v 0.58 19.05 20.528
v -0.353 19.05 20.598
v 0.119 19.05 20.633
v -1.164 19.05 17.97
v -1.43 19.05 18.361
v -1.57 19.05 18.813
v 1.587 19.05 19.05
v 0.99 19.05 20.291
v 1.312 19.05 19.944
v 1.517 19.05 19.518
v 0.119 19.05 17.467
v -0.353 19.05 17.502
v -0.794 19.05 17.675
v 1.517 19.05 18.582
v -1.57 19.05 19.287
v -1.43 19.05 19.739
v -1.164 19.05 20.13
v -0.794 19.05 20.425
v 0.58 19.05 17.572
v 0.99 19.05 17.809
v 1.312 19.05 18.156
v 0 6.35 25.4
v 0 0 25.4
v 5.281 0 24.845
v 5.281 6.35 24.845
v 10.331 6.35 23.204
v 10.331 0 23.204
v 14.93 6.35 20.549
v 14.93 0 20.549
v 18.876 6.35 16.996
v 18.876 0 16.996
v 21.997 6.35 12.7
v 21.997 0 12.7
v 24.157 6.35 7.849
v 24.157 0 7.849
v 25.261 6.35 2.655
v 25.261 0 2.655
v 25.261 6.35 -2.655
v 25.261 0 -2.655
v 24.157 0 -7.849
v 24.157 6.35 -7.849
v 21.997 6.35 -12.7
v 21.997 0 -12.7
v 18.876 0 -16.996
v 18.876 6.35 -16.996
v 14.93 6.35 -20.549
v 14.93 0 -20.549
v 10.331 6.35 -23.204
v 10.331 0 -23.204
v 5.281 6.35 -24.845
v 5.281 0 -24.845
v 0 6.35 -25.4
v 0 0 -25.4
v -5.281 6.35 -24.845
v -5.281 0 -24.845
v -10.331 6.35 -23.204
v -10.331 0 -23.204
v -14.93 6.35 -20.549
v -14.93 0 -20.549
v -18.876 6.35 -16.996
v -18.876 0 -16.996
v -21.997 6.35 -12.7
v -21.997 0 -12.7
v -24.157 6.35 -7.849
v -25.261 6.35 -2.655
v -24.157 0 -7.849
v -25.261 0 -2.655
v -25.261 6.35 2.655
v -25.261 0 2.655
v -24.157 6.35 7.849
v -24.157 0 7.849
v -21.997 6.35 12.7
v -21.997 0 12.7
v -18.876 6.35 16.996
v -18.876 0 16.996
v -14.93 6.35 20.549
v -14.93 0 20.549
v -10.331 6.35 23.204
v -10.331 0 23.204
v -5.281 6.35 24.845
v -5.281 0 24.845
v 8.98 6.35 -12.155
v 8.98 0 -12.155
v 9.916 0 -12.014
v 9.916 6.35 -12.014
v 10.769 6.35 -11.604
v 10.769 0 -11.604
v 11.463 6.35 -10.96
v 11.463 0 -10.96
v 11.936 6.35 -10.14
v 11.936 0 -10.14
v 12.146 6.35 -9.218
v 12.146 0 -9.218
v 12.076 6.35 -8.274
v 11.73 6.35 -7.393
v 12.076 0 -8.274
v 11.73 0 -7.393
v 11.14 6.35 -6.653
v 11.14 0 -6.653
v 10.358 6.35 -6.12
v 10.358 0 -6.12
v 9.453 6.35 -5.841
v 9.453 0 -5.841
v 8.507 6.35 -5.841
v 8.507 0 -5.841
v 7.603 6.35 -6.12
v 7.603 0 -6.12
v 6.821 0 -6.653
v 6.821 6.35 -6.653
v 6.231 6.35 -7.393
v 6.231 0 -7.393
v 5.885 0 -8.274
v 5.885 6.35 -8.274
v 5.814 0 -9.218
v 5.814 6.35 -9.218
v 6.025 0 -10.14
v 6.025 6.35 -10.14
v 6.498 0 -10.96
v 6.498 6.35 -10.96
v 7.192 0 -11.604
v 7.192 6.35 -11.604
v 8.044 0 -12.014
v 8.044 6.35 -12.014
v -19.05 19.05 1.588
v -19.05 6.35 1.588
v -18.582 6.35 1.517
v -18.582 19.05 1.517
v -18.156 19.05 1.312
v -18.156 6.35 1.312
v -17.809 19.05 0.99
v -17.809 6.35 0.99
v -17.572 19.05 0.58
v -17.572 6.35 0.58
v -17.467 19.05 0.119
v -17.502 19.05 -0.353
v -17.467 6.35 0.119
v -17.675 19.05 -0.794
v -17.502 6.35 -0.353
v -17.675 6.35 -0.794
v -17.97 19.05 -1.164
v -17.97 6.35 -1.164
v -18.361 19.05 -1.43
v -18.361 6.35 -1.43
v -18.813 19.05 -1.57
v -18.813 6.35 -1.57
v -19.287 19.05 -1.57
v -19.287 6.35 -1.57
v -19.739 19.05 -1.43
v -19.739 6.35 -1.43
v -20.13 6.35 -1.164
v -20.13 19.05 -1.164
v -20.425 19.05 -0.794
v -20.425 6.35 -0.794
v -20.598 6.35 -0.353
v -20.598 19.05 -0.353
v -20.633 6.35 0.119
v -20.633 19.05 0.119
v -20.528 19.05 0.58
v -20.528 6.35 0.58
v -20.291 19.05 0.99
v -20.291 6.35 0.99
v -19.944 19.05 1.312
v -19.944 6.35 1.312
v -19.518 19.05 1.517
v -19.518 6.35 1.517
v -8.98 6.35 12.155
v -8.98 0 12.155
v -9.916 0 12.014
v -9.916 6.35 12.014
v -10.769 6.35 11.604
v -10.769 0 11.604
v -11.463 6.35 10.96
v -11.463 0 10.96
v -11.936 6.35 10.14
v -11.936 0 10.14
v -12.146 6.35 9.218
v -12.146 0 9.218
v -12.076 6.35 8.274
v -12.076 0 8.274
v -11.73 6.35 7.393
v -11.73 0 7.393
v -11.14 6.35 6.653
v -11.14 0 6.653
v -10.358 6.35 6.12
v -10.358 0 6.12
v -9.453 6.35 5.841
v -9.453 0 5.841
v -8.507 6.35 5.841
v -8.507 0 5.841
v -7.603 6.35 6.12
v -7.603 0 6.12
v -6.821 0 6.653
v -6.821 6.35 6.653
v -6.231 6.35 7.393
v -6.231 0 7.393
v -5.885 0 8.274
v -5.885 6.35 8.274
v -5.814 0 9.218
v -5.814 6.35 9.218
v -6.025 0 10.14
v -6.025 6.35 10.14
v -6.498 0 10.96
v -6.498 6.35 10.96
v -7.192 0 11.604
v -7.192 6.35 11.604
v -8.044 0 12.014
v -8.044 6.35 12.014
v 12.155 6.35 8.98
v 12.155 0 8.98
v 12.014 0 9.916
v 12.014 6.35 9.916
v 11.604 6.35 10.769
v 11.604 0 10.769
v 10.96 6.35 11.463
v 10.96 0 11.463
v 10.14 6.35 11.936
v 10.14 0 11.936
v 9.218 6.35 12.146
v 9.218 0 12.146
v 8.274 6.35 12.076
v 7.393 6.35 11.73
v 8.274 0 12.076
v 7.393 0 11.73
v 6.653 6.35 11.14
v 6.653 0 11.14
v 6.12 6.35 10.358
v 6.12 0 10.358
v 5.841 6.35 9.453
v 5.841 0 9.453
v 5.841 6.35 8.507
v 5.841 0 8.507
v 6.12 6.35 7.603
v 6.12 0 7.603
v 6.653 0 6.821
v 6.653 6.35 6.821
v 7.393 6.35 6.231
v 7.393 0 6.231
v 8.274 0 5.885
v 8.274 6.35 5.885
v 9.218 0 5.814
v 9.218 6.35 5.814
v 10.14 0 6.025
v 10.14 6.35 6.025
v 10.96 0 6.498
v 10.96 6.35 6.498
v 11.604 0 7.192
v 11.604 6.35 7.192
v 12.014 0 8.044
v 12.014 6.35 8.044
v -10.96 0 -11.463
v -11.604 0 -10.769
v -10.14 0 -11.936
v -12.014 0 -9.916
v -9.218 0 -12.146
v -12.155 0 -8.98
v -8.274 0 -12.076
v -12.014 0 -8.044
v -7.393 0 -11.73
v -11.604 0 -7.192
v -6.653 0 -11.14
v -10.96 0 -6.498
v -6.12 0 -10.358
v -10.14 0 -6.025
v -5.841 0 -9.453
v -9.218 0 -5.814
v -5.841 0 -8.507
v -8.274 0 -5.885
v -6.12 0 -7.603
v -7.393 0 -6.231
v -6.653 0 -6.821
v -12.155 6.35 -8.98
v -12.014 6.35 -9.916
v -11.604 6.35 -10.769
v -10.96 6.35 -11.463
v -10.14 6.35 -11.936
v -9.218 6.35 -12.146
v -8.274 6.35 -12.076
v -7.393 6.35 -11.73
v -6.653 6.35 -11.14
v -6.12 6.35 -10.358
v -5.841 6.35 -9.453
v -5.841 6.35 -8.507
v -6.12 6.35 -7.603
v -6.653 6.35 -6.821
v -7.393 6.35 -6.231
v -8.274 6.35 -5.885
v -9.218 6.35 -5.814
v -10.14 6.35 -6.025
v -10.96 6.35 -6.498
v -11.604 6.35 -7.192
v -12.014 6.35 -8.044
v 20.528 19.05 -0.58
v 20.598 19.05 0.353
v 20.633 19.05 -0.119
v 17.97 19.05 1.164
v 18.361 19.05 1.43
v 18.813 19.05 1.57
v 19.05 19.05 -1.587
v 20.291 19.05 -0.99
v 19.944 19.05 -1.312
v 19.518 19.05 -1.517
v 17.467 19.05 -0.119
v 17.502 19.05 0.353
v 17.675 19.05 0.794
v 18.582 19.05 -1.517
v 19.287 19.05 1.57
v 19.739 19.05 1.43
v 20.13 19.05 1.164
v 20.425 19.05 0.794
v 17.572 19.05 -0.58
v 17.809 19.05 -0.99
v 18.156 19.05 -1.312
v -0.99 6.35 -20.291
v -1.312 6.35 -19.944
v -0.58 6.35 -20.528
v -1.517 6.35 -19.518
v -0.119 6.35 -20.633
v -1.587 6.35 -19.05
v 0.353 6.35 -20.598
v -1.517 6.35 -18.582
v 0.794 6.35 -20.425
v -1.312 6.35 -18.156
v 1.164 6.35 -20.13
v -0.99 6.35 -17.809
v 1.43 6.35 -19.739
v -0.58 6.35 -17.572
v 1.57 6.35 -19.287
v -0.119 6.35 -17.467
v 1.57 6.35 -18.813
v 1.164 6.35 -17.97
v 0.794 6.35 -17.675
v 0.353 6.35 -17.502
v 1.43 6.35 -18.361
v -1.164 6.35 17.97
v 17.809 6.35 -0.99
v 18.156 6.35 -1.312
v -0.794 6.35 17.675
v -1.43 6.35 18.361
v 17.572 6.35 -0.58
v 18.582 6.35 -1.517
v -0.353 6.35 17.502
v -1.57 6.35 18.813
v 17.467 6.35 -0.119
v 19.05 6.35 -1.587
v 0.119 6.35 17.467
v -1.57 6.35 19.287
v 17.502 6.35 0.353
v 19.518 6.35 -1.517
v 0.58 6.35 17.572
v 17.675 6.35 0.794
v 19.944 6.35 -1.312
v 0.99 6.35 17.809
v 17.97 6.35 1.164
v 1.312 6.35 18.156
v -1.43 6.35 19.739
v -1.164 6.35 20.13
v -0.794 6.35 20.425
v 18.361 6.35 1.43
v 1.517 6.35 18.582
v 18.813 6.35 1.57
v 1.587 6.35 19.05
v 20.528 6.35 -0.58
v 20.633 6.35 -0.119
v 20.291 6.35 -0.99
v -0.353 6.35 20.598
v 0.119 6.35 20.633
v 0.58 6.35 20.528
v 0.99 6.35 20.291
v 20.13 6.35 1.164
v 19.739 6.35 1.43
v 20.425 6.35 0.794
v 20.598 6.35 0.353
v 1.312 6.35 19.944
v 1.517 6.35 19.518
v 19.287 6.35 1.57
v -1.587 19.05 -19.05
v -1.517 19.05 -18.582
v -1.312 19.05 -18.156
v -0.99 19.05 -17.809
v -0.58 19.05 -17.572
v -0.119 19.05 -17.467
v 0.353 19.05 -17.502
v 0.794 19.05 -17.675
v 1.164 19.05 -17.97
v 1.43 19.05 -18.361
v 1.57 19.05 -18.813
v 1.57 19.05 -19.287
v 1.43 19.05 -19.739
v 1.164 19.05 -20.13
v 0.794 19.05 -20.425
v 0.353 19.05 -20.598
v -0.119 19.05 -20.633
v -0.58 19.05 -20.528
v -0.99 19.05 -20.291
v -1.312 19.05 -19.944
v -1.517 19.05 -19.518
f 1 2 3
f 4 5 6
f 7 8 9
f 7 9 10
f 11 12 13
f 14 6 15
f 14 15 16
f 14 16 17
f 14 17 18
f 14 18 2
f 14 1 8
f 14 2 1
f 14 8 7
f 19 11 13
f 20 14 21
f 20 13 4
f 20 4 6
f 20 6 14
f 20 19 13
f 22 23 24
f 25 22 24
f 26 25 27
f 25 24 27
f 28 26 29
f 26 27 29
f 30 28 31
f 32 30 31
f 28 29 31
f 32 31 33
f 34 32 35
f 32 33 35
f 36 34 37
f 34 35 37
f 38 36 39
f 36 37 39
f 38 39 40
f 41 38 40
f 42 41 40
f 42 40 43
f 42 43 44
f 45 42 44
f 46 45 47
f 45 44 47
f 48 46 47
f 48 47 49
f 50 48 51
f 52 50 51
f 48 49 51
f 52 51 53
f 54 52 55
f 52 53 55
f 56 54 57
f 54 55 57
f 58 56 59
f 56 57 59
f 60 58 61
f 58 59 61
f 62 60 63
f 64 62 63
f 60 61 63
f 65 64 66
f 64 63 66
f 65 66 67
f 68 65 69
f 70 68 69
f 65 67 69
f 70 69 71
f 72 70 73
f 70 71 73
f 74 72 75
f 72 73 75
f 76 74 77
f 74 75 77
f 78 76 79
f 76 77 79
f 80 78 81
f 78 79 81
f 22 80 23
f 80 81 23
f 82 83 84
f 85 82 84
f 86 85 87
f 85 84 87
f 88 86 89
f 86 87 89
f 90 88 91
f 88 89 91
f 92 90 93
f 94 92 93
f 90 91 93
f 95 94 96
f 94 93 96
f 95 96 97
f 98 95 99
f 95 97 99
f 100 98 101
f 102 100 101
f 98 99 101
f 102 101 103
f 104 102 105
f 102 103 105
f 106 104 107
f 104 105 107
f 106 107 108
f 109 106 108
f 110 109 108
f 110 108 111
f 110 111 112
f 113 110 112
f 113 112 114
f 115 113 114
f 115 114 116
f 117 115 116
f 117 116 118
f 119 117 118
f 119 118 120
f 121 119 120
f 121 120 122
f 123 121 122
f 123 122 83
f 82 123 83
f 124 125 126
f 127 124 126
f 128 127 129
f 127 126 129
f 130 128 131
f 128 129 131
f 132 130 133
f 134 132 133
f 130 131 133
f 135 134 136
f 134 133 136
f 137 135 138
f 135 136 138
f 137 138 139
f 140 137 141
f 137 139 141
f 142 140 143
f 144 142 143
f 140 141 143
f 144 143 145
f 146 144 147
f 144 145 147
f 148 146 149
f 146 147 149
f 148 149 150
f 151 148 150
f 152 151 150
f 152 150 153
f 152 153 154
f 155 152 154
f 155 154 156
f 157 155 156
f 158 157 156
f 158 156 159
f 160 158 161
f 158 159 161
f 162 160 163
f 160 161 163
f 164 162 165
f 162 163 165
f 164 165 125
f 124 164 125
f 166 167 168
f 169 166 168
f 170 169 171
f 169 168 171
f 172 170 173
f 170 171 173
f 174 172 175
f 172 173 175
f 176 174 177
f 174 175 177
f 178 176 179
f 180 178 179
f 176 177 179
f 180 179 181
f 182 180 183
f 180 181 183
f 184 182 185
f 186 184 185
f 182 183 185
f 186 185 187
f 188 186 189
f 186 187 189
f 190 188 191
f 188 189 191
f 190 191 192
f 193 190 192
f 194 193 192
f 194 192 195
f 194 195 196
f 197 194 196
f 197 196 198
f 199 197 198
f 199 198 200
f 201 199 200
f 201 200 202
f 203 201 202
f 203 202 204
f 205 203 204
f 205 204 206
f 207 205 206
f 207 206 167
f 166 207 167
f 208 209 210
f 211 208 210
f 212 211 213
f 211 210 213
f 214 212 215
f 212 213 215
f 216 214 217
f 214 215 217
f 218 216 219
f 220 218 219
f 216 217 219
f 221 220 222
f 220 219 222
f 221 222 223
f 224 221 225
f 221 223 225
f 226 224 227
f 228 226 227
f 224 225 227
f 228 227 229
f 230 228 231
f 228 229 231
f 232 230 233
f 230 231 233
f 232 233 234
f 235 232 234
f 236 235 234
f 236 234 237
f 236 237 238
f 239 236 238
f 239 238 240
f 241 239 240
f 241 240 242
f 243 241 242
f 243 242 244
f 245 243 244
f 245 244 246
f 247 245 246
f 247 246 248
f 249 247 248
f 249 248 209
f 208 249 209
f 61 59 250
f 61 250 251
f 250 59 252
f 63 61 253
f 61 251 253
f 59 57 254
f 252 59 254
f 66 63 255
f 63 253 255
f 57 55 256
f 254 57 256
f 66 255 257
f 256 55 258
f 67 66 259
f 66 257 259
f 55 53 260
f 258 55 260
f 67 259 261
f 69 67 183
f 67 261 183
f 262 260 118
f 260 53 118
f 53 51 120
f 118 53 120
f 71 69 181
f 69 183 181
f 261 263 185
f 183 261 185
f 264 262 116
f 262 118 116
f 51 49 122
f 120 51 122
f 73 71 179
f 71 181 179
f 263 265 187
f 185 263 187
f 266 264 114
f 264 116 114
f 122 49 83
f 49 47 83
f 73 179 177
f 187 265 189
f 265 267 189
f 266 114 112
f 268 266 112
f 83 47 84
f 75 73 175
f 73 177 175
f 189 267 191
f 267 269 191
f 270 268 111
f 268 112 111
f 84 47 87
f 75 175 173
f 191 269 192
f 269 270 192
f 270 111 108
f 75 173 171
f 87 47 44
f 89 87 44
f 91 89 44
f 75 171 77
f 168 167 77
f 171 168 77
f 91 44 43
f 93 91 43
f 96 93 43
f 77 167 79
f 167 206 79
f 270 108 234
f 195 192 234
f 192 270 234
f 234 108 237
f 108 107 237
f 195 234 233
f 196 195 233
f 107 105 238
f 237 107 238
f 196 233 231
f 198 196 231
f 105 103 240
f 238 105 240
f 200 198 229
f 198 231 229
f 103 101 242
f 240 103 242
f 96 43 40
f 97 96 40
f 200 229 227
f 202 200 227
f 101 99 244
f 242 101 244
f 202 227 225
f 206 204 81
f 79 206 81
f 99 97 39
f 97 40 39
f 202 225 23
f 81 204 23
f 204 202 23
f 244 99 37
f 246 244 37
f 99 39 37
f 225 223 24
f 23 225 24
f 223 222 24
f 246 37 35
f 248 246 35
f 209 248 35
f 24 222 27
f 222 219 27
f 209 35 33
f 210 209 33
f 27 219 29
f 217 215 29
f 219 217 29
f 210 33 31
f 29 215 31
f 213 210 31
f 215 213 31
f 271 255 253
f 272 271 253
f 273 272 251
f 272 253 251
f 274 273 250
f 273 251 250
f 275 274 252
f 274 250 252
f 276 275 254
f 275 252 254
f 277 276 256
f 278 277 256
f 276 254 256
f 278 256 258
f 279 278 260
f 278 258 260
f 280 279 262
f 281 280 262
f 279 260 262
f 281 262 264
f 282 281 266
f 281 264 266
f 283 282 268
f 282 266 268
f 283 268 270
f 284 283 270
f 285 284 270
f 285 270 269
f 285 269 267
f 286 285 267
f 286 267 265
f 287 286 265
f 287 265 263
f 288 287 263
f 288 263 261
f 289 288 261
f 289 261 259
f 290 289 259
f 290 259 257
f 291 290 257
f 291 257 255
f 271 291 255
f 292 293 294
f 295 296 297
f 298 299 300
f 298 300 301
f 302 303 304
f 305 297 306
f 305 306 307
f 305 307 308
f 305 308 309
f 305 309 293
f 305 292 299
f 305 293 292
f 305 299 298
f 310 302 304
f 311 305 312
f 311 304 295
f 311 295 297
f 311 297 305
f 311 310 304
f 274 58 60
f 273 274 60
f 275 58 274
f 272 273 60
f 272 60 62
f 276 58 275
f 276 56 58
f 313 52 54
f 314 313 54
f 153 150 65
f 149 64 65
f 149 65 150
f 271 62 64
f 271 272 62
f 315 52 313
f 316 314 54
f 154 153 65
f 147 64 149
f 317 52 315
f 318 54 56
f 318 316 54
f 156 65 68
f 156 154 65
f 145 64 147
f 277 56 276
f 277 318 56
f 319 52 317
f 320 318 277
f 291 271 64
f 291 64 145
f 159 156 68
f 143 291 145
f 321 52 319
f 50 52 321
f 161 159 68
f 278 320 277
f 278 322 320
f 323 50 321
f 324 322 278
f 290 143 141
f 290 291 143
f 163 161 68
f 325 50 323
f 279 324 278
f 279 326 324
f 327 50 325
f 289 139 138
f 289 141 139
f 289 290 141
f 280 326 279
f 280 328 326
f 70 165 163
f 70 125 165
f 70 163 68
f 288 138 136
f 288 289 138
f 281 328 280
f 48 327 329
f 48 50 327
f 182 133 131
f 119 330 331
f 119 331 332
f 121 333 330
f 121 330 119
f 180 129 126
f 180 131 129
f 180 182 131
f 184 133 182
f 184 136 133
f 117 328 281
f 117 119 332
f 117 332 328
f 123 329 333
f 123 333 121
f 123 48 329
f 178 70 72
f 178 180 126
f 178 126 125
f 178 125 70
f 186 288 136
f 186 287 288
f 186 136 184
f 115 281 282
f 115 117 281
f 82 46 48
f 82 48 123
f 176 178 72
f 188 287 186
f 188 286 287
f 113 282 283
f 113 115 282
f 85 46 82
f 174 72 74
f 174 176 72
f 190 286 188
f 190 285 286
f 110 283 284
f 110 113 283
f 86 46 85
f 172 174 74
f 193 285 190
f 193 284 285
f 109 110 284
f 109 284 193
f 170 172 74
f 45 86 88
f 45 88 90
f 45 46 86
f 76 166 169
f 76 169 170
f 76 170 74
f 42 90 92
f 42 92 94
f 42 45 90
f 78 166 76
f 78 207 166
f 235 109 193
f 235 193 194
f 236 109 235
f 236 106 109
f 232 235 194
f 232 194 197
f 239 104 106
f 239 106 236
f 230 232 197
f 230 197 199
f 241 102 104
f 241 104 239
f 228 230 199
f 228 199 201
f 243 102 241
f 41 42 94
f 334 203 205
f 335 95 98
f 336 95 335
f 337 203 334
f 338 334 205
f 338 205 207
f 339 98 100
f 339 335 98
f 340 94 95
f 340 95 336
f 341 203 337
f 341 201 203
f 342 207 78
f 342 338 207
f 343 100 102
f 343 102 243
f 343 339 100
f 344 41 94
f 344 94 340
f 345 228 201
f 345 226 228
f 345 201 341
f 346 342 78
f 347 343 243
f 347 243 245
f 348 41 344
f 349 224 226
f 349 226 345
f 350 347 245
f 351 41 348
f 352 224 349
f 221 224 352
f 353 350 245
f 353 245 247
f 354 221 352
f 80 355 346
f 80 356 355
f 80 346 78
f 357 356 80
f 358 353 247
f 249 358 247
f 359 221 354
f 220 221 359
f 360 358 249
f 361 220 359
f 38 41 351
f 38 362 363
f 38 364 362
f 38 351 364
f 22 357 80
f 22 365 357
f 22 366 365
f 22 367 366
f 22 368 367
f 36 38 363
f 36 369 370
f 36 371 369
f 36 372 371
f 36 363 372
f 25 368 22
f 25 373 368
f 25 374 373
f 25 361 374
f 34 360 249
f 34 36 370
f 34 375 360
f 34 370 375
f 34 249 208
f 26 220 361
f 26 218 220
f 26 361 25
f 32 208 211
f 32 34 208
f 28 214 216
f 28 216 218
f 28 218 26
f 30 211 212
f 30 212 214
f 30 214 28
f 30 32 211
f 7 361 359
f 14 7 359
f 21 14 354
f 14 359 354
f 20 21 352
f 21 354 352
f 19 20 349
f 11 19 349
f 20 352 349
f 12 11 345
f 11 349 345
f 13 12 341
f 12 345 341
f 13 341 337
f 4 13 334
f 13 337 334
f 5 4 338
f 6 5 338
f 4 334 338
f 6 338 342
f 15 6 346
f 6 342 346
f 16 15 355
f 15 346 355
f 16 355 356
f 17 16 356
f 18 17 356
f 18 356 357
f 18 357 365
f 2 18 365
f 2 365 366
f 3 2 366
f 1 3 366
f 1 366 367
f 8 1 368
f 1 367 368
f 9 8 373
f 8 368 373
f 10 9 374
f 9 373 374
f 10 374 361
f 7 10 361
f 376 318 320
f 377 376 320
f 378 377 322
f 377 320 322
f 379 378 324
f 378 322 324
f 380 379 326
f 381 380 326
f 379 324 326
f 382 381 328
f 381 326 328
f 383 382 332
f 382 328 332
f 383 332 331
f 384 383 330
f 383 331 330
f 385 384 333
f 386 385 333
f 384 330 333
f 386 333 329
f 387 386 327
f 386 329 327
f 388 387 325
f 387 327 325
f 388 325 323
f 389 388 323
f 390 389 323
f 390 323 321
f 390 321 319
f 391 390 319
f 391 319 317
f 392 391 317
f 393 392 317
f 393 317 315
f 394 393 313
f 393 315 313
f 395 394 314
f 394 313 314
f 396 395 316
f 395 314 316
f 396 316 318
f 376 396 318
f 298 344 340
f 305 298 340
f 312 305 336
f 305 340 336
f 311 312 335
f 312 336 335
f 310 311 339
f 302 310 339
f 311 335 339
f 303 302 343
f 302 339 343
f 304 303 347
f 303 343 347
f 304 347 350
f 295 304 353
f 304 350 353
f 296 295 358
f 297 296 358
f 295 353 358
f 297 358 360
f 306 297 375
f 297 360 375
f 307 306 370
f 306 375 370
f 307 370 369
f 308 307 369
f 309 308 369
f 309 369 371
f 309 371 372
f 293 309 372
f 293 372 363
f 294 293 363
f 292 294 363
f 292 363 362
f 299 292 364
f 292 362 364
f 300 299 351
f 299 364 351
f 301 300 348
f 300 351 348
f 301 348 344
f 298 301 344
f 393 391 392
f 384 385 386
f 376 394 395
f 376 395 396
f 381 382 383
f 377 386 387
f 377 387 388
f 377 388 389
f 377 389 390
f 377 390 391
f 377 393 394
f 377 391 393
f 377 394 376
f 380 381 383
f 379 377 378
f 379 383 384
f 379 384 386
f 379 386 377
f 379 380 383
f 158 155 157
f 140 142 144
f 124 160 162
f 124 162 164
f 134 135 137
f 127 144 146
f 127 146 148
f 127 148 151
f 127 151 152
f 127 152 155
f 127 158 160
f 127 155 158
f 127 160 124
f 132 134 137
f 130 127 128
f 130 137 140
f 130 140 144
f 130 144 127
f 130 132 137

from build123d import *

# Parameters (mm, degrees)
SKETCH1_R           = 25.4
BOSS_EXTRUDE1_DEPTH = 6.35
SKETCH2_R           = 1.5875
BOSS_EXTRUDE2_DEPTH = 12.7
CIRPATTERN1_COUNT   = 4
SKETCH3_R           = 3.175
CUT_EXTRUDE1_DEPTH  = 41.659838908
CIRPATTERN2_COUNT   = 4


with BuildPart() as part:
    # Sketch1 → Boss-Extrude1 (new body)
    with BuildSketch(Plane(origin=(0, 0, 0), x_dir=(1, 0, 0), z_dir=(0, 1, 0))):
        with Locations(Location((0, 0, 0), (0, 0, 270))):
            Circle(SKETCH1_R)
    extrude(amount=BOSS_EXTRUDE1_DEPTH)

    # Sketch2 → Boss-Extrude2 (add)
    with BuildSketch(Plane(origin=(0, 6.35, 0), x_dir=(1, 0, 0), z_dir=(0, 1, 0))):
        with Locations(Location((-19.05, 0, 0), (0, 0, 270))):
            Circle(SKETCH2_R)
    boss_extrude2 = extrude(amount=BOSS_EXTRUDE2_DEPTH)

    # CirPattern1: Boss-Extrude2 ×4 about axis
    cirpattern1_axis = Axis((0, 0, 0), (0, 1, 0))
    for i in range(1, CIRPATTERN1_COUNT):
        add(boss_extrude2.rotate(cirpattern1_axis, i * 360 / CIRPATTERN1_COUNT))

    # Sketch3 → Cut-Extrude1 (cut, through all)
    with BuildSketch(Plane.XZ):
        with Locations(Location((8.980256121, -8.980256121, 0), (0, 0, 270))):
            Circle(SKETCH3_R)
    cut_extrude1 = extrude(amount=-CUT_EXTRUDE1_DEPTH, mode=Mode.SUBTRACT)

    # CirPattern2: Cut-Extrude1 ×4 about axis
    cirpattern2_axis = Axis((0, 0, 0), (0, 1, 0))
    for i in range(1, CIRPATTERN2_COUNT):
        add(cut_extrude1.rotate(cirpattern2_axis, i * 360 / CIRPATTERN2_COUNT), mode=Mode.SUBTRACT)


solid = part.part
